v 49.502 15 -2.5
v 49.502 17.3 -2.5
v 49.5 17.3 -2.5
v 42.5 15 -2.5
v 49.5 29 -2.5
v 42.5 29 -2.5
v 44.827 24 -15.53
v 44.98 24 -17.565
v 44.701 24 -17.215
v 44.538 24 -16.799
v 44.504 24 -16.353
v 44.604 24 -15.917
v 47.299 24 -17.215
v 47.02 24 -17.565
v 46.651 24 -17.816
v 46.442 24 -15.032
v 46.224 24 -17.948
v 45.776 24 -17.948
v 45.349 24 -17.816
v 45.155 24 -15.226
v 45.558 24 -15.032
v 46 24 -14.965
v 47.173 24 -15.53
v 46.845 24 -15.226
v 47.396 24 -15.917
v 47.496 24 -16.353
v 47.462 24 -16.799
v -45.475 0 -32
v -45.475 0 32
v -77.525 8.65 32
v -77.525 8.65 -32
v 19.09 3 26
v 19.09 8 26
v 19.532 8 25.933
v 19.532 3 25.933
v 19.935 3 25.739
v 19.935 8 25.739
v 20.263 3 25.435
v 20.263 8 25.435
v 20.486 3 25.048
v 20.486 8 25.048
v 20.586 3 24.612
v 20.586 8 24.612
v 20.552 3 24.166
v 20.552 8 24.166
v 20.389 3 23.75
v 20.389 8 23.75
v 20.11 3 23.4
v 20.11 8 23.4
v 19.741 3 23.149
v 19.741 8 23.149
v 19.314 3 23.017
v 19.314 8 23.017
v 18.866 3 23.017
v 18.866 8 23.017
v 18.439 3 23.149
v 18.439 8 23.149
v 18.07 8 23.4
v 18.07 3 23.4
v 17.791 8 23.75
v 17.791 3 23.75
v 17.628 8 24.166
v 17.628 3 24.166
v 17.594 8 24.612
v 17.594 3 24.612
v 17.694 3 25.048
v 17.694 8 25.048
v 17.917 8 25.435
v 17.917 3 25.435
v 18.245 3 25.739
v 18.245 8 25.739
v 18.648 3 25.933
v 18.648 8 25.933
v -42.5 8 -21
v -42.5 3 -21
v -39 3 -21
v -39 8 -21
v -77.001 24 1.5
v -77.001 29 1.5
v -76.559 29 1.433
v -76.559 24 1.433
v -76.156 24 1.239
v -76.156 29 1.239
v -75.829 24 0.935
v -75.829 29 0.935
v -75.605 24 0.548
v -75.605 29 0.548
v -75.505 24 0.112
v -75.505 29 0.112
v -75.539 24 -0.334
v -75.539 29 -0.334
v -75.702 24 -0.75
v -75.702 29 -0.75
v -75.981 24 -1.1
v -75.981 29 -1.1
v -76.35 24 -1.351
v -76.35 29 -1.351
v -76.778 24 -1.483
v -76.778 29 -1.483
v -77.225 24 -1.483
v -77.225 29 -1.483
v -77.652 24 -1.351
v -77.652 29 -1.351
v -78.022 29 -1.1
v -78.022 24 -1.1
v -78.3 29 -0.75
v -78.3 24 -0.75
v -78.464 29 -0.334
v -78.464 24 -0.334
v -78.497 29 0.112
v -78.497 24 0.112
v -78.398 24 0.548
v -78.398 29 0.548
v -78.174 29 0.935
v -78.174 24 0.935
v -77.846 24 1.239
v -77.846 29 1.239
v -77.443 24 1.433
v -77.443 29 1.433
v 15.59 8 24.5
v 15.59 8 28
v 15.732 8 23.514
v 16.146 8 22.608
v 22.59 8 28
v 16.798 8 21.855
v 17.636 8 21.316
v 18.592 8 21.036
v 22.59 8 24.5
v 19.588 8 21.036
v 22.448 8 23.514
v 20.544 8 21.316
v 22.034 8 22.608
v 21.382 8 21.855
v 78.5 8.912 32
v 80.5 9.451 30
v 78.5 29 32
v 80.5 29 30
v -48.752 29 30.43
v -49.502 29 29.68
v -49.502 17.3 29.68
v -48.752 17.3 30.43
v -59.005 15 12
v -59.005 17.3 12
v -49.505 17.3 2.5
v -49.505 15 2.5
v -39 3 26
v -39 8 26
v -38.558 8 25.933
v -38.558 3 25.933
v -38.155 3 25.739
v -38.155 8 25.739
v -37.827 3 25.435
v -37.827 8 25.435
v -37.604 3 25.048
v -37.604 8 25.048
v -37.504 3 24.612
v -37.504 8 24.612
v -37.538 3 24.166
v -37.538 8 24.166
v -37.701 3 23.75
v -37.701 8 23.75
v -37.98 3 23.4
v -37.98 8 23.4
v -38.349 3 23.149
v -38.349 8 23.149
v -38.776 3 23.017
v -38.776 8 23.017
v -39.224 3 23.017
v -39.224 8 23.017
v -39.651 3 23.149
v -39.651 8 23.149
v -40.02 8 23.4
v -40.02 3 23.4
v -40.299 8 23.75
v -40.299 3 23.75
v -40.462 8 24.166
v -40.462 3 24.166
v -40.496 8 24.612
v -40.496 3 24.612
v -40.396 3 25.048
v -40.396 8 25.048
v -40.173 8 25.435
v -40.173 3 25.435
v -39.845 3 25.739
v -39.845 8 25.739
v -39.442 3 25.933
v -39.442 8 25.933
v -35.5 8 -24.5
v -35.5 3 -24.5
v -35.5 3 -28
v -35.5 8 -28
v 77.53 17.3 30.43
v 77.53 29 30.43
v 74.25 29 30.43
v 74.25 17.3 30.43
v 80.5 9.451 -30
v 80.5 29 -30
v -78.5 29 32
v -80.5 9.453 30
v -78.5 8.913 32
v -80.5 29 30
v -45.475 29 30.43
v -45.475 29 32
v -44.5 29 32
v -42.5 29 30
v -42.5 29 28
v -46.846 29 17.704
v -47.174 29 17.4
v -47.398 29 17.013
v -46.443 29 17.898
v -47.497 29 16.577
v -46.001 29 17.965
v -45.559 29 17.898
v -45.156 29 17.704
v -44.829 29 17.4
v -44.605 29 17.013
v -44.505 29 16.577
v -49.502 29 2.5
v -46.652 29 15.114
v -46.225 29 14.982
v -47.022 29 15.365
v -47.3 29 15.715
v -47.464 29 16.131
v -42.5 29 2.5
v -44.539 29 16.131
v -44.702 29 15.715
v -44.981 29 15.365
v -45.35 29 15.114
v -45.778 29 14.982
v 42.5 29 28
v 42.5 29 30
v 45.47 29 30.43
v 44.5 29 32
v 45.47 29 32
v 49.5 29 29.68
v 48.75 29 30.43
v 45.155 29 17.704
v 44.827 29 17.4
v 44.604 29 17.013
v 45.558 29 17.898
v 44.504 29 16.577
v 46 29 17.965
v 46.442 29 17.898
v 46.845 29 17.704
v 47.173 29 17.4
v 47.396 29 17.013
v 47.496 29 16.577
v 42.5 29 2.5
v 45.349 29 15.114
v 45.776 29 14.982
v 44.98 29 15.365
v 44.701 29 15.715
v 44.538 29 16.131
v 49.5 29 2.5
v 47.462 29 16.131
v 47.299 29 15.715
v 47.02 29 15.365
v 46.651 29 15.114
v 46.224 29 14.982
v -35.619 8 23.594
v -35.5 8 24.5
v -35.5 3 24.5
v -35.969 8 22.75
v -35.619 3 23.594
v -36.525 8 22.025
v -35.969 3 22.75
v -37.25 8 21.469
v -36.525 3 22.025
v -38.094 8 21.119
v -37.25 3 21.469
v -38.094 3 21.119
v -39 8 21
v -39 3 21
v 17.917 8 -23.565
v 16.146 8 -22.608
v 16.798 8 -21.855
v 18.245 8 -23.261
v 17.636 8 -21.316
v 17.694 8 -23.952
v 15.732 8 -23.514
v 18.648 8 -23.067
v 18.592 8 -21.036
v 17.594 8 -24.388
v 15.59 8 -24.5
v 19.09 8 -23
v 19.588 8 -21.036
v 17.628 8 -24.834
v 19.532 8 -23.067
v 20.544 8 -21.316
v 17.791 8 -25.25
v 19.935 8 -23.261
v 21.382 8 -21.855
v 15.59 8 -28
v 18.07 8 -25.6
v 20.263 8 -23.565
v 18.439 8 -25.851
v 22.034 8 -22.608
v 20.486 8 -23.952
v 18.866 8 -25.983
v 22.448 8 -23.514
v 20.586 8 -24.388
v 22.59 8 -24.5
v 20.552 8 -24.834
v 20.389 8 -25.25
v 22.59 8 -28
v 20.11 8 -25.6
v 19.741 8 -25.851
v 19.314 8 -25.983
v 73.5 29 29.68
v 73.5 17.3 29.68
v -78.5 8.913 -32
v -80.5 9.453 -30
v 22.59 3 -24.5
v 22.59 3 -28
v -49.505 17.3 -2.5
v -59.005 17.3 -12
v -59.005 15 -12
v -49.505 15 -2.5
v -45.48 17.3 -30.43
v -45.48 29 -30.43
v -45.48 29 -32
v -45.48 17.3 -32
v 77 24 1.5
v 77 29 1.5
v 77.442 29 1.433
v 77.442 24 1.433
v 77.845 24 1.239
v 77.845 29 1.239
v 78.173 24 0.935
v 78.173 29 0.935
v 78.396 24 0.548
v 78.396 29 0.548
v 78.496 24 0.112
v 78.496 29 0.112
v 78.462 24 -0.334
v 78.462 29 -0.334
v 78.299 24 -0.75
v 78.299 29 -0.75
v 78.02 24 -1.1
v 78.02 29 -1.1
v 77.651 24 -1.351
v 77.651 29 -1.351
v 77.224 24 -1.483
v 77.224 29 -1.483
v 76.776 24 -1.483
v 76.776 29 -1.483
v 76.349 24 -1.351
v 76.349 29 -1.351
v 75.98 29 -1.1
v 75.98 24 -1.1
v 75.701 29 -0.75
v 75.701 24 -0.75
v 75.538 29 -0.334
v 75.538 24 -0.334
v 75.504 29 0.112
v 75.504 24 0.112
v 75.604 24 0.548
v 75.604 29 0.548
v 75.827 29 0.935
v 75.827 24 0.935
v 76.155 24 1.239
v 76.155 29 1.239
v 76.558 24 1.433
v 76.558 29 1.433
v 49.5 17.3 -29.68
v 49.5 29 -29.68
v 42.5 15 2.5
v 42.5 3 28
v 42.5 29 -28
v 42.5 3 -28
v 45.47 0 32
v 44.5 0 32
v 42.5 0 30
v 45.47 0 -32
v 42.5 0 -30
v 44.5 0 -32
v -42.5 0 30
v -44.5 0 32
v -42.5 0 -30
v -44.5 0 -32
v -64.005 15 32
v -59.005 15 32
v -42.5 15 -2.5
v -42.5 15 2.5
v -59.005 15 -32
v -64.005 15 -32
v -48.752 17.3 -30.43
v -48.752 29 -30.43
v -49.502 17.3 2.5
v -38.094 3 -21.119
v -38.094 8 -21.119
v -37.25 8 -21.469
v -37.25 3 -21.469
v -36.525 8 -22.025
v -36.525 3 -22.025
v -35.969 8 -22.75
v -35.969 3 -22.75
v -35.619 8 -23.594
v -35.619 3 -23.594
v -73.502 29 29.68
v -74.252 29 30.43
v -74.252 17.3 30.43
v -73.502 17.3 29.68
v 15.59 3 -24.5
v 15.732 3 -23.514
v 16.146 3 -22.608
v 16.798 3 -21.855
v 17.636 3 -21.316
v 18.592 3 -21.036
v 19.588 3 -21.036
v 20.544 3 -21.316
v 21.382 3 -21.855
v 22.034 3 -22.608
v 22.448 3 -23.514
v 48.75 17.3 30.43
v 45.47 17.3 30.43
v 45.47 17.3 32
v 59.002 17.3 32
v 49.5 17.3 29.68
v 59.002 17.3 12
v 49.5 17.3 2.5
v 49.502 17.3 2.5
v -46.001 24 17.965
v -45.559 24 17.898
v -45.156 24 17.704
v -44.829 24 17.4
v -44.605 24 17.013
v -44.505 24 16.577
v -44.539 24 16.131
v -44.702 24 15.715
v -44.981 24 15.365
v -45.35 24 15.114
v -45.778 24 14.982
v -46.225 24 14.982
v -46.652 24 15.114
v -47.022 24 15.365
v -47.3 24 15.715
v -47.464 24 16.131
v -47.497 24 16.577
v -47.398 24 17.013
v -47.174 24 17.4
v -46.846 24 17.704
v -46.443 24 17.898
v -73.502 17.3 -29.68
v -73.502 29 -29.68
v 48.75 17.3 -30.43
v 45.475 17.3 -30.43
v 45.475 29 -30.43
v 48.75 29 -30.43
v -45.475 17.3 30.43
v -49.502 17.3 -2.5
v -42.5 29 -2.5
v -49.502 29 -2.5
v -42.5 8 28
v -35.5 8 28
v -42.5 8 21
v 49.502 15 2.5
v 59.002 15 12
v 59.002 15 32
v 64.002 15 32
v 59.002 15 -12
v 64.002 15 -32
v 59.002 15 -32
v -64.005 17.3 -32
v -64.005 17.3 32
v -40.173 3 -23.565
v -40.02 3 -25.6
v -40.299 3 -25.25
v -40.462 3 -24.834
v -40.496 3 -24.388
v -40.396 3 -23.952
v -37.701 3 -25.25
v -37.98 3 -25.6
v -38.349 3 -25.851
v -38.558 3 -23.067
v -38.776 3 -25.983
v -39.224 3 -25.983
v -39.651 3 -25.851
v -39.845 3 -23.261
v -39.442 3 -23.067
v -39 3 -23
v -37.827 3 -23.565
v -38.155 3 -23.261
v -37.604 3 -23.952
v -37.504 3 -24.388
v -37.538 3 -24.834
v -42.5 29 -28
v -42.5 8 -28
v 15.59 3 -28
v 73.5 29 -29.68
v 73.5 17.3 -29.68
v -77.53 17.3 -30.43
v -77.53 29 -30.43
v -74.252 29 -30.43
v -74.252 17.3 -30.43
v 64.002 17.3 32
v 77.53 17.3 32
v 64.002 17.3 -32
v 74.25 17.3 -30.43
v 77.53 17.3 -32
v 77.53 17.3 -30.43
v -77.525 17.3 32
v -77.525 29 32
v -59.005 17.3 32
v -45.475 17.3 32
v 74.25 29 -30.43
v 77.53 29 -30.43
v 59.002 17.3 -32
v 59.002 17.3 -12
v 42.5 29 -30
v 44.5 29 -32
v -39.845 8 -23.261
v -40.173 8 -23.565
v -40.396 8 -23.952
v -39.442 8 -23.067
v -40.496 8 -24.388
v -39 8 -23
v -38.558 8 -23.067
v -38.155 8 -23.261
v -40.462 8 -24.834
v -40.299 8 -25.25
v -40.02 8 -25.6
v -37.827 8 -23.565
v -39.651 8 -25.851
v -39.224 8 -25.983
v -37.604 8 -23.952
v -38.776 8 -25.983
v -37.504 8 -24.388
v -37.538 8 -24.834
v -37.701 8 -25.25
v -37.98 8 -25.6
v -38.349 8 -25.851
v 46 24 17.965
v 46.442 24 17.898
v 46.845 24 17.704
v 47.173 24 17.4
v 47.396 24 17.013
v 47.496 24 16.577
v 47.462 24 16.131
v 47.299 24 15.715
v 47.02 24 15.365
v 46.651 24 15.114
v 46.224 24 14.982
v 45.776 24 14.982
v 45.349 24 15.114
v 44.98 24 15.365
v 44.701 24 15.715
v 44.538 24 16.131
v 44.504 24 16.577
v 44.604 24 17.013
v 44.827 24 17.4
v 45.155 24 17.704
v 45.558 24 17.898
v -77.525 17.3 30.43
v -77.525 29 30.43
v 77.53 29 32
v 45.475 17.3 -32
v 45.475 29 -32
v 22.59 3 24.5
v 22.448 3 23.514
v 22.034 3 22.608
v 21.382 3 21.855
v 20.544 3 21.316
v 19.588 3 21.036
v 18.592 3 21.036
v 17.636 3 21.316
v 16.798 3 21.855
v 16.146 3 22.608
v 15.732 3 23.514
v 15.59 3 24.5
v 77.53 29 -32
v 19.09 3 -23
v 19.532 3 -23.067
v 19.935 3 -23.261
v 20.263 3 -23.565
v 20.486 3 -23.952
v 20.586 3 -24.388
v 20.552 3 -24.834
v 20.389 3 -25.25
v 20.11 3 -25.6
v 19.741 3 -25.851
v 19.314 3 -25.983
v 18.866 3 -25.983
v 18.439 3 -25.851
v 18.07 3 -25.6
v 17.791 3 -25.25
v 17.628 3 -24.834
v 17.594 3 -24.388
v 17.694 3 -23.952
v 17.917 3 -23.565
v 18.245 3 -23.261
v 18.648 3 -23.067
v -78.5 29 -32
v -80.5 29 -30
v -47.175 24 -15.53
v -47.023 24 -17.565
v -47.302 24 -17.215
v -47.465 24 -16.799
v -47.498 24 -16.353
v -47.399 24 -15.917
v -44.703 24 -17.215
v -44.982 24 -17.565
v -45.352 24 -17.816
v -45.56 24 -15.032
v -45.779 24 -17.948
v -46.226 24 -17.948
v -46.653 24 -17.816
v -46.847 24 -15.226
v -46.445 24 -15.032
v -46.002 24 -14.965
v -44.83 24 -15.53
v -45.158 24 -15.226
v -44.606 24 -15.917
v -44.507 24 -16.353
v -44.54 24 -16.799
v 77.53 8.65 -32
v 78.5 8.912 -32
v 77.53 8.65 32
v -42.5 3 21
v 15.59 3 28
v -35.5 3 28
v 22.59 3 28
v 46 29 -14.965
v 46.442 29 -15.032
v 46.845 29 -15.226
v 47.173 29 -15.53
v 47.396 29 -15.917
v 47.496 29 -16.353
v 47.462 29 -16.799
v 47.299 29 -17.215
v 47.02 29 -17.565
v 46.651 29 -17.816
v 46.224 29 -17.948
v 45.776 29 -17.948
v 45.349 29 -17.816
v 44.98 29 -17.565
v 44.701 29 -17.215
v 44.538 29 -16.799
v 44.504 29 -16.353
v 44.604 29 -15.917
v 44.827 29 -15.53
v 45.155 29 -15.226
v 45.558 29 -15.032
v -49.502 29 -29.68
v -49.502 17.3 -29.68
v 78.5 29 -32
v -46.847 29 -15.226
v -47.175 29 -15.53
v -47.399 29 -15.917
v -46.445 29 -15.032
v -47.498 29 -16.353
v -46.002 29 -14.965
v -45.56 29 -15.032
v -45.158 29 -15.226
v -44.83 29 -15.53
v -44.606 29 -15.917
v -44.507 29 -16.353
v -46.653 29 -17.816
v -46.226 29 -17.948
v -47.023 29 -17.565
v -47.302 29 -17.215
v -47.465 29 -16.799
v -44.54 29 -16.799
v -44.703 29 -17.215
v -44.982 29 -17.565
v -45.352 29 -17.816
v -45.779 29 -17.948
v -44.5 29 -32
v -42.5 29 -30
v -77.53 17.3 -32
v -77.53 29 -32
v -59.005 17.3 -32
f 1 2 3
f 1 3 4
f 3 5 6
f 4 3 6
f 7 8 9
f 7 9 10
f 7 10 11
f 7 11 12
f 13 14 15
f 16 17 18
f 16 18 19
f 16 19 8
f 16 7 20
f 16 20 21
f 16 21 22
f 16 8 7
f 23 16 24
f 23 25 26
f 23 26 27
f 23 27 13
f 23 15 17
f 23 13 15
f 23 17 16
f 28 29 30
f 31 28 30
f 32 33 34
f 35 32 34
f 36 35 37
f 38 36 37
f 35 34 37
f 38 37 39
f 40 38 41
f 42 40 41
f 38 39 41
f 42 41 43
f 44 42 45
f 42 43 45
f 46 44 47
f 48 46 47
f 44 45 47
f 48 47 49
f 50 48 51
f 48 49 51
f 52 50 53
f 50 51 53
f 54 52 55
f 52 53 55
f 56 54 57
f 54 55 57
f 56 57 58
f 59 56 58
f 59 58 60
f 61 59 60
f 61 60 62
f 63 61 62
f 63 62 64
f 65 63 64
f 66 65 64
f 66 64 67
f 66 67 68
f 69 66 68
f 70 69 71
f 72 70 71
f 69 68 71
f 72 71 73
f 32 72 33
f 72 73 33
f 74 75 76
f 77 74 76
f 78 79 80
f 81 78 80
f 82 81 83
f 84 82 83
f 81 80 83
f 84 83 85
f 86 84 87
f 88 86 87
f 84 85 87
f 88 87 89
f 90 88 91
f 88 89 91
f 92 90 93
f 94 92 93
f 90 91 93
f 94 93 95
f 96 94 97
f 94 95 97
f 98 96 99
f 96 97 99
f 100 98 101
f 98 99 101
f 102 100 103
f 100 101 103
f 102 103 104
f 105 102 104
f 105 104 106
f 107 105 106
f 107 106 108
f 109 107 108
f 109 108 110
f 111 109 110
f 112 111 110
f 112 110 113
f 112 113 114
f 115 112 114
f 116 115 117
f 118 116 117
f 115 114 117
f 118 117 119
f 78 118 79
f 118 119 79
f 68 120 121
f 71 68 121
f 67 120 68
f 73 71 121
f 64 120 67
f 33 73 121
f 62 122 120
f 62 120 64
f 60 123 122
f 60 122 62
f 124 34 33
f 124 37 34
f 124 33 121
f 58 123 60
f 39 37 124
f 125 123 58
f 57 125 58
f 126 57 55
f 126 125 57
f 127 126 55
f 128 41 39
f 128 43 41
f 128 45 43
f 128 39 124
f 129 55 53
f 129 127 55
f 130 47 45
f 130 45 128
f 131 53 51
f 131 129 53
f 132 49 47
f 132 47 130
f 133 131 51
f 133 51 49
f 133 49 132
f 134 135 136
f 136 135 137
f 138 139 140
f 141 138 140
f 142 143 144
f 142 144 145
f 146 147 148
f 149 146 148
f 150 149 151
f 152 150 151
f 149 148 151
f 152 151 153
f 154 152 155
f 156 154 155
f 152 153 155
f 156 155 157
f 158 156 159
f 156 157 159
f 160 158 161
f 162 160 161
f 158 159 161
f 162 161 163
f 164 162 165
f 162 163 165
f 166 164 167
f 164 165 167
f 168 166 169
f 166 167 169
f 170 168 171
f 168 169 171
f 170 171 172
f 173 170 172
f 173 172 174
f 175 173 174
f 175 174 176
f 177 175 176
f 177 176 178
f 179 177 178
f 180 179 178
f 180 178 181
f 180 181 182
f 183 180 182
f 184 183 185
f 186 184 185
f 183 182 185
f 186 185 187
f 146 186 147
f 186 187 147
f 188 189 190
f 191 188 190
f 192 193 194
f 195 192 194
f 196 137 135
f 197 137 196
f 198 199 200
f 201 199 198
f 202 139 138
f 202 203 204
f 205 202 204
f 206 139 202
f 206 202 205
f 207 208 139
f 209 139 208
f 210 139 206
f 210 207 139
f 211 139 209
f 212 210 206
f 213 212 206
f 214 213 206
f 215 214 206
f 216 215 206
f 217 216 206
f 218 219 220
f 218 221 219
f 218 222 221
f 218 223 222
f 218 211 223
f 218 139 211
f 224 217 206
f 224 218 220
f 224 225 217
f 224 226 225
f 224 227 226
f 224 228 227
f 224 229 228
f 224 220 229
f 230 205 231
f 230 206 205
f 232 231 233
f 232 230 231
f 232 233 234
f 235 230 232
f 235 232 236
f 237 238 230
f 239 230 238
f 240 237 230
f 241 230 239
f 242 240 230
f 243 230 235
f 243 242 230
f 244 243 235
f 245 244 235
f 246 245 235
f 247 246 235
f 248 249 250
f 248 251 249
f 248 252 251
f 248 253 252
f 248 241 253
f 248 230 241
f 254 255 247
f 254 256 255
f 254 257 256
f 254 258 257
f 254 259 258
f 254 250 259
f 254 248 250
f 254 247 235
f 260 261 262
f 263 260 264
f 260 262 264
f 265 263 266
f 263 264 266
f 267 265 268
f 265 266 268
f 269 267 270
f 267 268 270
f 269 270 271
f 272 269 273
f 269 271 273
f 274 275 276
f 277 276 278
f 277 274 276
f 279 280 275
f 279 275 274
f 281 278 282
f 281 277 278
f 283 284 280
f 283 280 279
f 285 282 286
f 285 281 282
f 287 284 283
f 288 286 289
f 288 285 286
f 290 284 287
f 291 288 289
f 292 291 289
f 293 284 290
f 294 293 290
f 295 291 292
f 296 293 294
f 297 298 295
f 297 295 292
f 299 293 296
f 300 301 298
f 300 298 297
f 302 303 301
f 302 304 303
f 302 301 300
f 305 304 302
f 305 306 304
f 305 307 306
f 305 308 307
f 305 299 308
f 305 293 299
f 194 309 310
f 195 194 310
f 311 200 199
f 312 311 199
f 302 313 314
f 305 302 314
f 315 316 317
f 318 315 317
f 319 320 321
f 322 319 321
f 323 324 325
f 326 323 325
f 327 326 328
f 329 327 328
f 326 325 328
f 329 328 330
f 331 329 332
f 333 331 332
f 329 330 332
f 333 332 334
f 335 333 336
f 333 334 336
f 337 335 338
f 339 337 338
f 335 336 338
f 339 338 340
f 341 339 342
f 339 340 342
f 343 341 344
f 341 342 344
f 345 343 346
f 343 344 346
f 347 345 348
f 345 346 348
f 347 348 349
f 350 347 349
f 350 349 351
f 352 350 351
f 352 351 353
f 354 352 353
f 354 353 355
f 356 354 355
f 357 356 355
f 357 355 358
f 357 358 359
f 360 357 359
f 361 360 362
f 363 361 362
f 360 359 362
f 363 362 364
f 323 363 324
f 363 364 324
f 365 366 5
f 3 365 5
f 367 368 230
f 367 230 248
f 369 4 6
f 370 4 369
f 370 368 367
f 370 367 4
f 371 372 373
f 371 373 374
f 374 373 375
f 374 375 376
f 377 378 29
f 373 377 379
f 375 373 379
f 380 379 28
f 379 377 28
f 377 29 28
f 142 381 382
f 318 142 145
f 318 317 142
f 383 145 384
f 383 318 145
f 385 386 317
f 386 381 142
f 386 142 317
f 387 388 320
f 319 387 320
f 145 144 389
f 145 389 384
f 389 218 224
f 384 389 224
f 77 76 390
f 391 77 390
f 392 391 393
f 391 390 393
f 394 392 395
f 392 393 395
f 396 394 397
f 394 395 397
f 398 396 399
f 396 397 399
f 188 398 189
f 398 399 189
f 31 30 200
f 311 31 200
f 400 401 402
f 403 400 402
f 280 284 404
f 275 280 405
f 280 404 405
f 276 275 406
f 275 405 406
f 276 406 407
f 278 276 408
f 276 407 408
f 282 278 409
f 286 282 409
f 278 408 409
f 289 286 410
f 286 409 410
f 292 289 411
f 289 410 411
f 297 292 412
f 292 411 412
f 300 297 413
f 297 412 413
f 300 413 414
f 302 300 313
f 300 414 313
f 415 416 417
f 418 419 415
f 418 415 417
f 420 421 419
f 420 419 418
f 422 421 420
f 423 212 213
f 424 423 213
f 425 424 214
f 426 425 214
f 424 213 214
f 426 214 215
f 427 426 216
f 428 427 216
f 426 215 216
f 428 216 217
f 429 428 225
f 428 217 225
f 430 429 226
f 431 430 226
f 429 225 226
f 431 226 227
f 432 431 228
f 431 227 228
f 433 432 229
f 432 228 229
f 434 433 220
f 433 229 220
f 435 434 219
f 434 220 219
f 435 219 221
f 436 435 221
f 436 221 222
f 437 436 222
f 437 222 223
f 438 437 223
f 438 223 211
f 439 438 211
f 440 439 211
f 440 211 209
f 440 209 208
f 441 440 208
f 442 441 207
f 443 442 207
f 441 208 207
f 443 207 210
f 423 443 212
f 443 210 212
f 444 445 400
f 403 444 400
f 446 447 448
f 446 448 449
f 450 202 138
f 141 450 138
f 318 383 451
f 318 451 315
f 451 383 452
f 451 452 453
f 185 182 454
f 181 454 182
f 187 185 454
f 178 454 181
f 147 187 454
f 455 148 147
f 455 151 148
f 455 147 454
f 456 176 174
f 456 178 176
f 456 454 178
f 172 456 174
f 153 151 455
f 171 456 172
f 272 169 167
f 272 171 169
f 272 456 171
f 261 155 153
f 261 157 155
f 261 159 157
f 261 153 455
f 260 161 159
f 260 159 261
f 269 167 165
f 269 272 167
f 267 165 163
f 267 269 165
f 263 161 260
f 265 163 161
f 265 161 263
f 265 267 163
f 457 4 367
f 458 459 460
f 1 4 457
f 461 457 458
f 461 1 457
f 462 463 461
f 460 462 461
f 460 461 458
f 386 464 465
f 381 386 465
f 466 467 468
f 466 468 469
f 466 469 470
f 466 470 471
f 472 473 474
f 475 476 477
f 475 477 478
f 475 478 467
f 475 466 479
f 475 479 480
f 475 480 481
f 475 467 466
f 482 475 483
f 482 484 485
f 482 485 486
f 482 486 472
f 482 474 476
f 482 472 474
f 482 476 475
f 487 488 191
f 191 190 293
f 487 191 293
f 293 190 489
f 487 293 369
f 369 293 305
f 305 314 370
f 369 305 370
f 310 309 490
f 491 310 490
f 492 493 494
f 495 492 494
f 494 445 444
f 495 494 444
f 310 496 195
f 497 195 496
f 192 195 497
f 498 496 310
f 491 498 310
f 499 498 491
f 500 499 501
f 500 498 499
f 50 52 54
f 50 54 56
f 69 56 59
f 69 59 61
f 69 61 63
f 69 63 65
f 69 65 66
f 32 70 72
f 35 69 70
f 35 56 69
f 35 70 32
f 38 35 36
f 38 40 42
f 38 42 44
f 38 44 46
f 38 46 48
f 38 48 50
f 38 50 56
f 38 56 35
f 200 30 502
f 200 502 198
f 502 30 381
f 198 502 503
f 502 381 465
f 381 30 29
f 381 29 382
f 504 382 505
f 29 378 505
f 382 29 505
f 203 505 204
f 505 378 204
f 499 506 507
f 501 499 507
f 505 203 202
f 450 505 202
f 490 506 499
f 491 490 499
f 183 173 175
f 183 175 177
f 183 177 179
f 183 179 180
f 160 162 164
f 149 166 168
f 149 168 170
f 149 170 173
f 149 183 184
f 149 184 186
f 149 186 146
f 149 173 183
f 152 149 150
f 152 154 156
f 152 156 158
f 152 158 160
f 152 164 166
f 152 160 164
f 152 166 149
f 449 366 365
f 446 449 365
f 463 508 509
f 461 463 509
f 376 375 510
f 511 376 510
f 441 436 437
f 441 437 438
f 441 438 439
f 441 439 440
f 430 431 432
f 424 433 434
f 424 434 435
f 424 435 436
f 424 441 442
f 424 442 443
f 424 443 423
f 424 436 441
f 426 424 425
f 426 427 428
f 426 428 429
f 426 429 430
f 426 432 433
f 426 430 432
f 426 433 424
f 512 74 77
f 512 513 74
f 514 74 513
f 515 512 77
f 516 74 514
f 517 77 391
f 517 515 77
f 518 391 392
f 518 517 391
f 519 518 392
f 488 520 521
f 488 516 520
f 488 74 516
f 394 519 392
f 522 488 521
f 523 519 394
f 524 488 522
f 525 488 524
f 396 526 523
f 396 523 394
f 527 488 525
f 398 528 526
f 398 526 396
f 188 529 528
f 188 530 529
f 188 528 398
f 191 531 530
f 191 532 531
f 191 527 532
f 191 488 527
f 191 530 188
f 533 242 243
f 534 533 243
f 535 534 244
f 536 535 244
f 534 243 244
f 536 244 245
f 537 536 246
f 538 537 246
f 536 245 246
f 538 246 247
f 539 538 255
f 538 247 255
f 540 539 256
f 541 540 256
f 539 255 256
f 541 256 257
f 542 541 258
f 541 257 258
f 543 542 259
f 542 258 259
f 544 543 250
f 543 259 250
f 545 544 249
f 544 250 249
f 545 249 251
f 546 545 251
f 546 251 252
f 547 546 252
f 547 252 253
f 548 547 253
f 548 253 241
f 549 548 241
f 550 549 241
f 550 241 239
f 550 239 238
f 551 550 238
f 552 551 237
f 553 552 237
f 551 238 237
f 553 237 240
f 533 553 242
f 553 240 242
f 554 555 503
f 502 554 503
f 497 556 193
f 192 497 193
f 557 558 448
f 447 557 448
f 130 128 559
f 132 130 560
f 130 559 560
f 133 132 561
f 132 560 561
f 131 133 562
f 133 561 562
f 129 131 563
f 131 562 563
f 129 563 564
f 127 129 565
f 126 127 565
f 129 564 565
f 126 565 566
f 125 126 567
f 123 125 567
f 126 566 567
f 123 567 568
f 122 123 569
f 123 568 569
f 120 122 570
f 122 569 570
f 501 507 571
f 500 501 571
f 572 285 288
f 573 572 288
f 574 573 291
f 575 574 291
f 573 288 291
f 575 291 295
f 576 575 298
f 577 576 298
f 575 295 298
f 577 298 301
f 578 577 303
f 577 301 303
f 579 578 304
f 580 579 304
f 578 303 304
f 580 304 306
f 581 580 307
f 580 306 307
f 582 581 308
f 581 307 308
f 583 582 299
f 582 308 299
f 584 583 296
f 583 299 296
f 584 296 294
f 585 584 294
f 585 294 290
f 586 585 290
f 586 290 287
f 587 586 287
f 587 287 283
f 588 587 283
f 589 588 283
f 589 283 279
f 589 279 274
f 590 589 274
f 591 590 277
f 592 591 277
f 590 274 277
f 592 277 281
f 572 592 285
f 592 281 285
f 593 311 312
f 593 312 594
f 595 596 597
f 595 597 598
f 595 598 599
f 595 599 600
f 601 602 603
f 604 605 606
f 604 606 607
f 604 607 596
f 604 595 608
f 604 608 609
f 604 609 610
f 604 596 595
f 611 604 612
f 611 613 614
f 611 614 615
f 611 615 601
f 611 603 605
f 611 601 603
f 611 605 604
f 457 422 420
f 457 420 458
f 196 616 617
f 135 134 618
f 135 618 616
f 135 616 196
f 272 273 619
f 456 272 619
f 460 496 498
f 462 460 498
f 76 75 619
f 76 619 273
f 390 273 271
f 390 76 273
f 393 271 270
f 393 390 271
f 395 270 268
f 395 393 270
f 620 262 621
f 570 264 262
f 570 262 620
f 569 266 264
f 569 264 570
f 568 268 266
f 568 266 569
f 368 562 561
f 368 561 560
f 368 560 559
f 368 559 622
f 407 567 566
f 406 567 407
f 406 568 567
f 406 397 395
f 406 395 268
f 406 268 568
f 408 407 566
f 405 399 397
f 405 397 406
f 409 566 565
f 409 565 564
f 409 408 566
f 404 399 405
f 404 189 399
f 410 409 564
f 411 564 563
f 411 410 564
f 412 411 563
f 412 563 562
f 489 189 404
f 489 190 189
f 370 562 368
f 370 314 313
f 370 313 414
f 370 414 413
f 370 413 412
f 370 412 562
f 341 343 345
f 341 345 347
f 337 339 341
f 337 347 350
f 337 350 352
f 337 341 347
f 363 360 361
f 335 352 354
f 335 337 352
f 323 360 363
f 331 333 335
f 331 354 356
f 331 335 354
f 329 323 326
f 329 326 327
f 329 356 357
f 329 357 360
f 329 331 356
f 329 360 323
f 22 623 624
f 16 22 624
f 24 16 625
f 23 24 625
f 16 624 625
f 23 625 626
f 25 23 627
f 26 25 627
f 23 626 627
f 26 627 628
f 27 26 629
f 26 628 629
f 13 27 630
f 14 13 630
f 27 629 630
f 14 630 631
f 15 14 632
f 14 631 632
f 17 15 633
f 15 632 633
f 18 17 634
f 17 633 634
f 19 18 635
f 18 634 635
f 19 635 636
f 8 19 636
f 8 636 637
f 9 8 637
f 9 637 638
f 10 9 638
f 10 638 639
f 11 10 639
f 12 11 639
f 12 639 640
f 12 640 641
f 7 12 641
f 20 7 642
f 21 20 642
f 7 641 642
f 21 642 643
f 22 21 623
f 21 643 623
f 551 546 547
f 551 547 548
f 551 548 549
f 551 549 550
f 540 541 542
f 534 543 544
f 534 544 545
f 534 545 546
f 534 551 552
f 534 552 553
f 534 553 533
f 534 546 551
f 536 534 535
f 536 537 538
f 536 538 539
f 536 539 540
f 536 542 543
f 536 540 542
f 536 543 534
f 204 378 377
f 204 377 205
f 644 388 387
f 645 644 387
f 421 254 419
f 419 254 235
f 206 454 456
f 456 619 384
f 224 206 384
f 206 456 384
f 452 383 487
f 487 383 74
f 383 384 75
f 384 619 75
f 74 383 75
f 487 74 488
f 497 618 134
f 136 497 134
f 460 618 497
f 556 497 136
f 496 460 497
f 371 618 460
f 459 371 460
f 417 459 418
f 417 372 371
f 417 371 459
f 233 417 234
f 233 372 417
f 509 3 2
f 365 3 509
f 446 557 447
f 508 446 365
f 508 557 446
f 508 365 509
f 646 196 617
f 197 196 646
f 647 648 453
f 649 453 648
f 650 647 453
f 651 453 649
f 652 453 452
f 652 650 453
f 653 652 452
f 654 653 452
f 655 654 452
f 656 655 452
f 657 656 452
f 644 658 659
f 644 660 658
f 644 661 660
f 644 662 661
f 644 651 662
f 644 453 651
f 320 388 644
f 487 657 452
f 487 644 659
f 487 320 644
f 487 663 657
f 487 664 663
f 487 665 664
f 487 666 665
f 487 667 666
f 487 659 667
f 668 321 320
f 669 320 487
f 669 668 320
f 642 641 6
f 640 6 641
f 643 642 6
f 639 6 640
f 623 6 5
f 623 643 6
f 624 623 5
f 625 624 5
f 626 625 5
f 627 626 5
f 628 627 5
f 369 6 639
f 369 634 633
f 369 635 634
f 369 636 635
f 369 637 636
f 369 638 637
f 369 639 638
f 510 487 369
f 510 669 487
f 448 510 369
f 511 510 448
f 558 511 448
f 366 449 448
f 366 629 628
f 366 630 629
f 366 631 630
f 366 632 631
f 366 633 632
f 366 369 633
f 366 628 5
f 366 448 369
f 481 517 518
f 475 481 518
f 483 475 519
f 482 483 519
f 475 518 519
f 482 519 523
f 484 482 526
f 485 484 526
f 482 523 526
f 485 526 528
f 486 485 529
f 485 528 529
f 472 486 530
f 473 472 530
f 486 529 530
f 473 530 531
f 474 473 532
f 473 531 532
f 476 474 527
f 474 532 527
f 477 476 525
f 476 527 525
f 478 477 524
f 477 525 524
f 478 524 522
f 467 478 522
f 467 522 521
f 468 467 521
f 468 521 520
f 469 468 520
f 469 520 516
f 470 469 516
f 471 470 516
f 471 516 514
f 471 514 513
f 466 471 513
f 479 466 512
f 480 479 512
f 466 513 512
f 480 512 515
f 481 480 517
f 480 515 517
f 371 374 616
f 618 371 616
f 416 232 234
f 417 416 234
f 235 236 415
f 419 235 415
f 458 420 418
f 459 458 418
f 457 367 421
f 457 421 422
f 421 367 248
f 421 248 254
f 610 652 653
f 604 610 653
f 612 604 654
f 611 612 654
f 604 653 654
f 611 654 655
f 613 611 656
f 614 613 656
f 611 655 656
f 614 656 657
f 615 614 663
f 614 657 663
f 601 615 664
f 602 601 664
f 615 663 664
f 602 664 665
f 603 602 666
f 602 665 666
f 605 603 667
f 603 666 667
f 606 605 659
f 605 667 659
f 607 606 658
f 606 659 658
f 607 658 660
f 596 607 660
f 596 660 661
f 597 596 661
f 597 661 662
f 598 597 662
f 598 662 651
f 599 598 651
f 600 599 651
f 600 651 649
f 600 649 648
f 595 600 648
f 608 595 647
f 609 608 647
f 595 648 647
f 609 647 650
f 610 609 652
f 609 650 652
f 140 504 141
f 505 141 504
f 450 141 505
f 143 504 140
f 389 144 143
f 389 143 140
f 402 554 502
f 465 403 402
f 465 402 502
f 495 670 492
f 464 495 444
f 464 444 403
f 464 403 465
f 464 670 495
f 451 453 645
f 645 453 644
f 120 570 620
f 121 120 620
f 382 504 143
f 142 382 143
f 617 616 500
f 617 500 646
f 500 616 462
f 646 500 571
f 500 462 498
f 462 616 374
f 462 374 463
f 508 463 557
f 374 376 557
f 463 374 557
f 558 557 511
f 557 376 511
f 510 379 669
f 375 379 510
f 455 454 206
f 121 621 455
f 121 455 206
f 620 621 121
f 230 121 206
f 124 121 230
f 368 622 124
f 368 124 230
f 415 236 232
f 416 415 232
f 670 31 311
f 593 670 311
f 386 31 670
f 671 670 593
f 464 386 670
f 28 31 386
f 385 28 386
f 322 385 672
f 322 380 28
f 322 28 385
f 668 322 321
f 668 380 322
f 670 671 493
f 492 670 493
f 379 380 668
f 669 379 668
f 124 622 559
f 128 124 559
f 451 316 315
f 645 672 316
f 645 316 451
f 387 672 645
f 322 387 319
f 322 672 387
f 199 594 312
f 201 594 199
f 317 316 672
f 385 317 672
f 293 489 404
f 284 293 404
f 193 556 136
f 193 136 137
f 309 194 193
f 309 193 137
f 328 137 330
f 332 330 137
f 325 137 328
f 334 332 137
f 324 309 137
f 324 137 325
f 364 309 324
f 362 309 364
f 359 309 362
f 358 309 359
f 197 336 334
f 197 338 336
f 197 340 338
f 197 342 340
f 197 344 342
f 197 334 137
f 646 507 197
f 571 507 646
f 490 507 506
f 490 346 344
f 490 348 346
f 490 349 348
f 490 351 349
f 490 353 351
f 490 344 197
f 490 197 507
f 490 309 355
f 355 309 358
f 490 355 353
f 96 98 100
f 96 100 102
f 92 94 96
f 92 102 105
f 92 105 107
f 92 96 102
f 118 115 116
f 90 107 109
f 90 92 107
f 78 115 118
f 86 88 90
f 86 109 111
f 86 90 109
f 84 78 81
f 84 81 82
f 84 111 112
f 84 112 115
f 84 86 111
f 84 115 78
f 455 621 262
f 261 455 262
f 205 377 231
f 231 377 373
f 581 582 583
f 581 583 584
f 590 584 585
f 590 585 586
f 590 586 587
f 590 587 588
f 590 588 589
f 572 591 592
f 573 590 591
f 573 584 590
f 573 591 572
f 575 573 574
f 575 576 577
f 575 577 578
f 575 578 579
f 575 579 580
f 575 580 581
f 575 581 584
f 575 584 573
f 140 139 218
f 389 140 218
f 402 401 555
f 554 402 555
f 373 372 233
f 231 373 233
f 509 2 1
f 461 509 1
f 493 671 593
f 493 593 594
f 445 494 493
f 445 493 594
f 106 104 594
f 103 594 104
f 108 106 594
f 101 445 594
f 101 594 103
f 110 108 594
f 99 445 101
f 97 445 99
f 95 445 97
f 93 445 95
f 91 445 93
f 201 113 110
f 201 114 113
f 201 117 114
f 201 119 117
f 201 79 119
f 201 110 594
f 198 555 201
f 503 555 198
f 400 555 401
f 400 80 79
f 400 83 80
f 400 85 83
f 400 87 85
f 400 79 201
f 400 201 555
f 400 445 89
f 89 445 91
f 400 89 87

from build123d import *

# Parameters (mm, degrees)
SKETCH2_W            = 85
SKETCH2_H            = 56
BOSS_EXTRUDE4_DEPTH  = 3
SKETCH3_W            = 89
SKETCH3_H            = 60
SKETCH3_W_2          = 85
SKETCH3_H_2          = 56
BOSS_EXTRUDE5_DEPTH  = 29
SKETCH5_R            = 3.5
BOSS_EXTRUDE10_DEPTH = 8
CUT_EXTRUDE1_DEPTH   = 11.7
CHAMFER1_SIZE        = 2
CUT_EXTRUDE2_DEPTH   = 11.7
SKETCH8_W            = 64
SKETCH8_H            = 29
BOSS_EXTRUDE11_DEPTH = 2
SKETCH9_W            = 64
SKETCH9_H            = 29
BOSS_EXTRUDE12_DEPTH = 2
CHAMFER2_SIZE        = 2
CHAMFER3_SIZE        = 0.75
CUT_EXTRUDE4_DEPTH   = 107.851532511
SKETCH10_W           = 7.0025
SKETCH10_H           = 5
SKETCH10_W_2         = 85
SKETCH10_W_3         = 7
CUT_EXTRUDE5_DEPTH   = 14
CHAMFER4_SIZE        = 9.5
SKETCH14_R           = 1.5
CUT_EXTRUDE7_DEPTH   = 5
SKETCH15_R           = 1.5
CUT_EXTRUDE8_DEPTH   = 5


with BuildPart() as part:
    # Sketch2 → Boss-Extrude4 (new body)
    with BuildSketch(Plane(origin=(0, 0, 0), x_dir=(1, 0, 0), z_dir=(0, 1, 0))):
        Rectangle(SKETCH2_W, SKETCH2_H)
    extrude(amount=BOSS_EXTRUDE4_DEPTH)

    # Sketch3 → Boss-Extrude5 (add)
    # profile 1 of 3: a face of its own
    with BuildSketch(Plane(origin=(0, 0, 0), x_dir=(1, 0, 0), z_dir=(0, 1, 0))):
        Rectangle(SKETCH3_W, SKETCH3_H)
        Rectangle(SKETCH3_W_2, SKETCH3_H_2, mode=Mode.SUBTRACT)
    # profile 2 of 3: a face of its own
    with BuildSketch(Plane(origin=(0, 0, 0), x_dir=(1, 0, 0), z_dir=(0, 1, 0))):
        Polygon((-78.5, -32), (-44.5, -32), (-44.5, -30), (-44.5, 30), (-44.5, 32), (-78.5, 32), (-78.5, 0), align=None)
    # profile 3 of 3: a face of its own
    with BuildSketch(Plane(origin=(0, 0, 0), x_dir=(1, 0, 0), z_dir=(0, 1, 0))):
        Polygon((44.5, -32), (44.5, -30), (44.5, 30), (44.5, 32), (78.5, 32), (78.5, 0), (78.5, -32), align=None)
    extrude(amount=BOSS_EXTRUDE5_DEPTH)

    # Sketch5 → Boss-Extrude10 (add)
    with BuildSketch(Plane(origin=(0, 0, 0), x_dir=(1, 0, 0), z_dir=(0, 1, 0))):
        with Locations((-39, 24.5)):
            Circle(SKETCH5_R)
        with BuildLine():
            ThreePointArc((-42.5, 24.5), (-41.474873734, 26.974873734), (-39, 28))
            Line((-39, 28), (-42.5, 28))
            Line((-42.5, 28), (-42.5, 24.5))
        make_face()
        with BuildLine():
            ThreePointArc((-39, 21), (-41.474873734, 22.025126266), (-42.5, 24.5))
            Line((-42.5, 24.5), (-42.5, 21))
            Line((-42.5, 21), (-39, 21))
        make_face()
        with BuildLine():
            Line((-35.5, 24.5), (-35.5, 28))
            Line((-35.5, 28), (-39, 28))
            ThreePointArc((-39, 28), (-36.525126266, 26.974873734), (-35.5, 24.5))
        make_face()
        with BuildLine():
            ThreePointArc((-35.5, -24.5), (-36.525126266, -26.974873734), (-39, -28))
            Line((-39, -28), (-35.5, -28))
            Line((-35.5, -28), (-35.5, -24.5))
        make_face()
        with Locations((-39, -24.5)):
            Circle(SKETCH5_R)
        with BuildLine():
            ThreePointArc((-39, -28), (-41.474873734, -26.974873734), (-42.5, -24.5))
            Line((-42.5, -24.5), (-42.5, -28))
            Line((-42.5, -28), (-39, -28))
        make_face()
        with BuildLine():
            Line((-39, -21), (-42.5, -21))
            Line((-42.5, -21), (-42.5, -24.5))
            ThreePointArc((-42.5, -24.5), (-41.474873734, -22.025126266), (-39, -21))
        make_face()
        with BuildLine():
            Line((19.08999999, -28), (22.59, -28))
            Line((22.59, -28), (22.59, -24.5))
            ThreePointArc((22.59, -24.5), (21.564873731, -26.974873738), (19.08999999, -28))
        make_face()
        with Locations((19.09, -24.5)):
            Circle(SKETCH5_R)
        with BuildLine():
            Line((15.59, -28), (19.08999999, -28))
            ThreePointArc((19.08999999, -28), (16.615126262, -26.974873731), (15.59, -24.5))
            Line((15.59, -24.5), (15.59, -28))
        make_face()
        with BuildLine():
            ThreePointArc((19.09, 28), (21.564873734, 26.974873734), (22.59, 24.5))
            Line((22.59, 24.5), (22.59, 28))
            Line((22.59, 28), (19.09, 28))
        make_face()
        with BuildLine():
            Line((15.59, 28), (15.59, 24.5))
            ThreePointArc((15.59, 24.5), (16.615126266, 26.974873734), (19.09, 28))
            Line((19.09, 28), (15.59, 28))
        make_face()
        with Locations((19.09, 24.5)):
            Circle(SKETCH5_R)
    extrude(amount=BOSS_EXTRUDE10_DEPTH)

    # Sketch6 → Cut-Extrude1 (cut)
    with BuildSketch(Plane(origin=(0, 29, 0), x_dir=(1, 0, 0), z_dir=(0, 1, 0))):
        Polygon((-73.5025, 30.43), (-49.5025, 30.43), (-45.48, 30.43), (-45.48, 32), (-77.53, 32), (-77.53, 30.43), align=None)
        Polygon((-73.5025, -30.43), (-49.5025, -30.43), (-49.5025, 0), (-49.5025, 30.43), (-73.5025, 30.43), (-73.5025, 0), align=None)
        Polygon((-77.525, -32), (-45.475, -32), (-45.475, -30.43), (-49.5025, -30.43), (-73.5025, -30.43), (-77.525, -30.43), align=None)
    extrude(amount=-CUT_EXTRUDE1_DEPTH, mode=Mode.SUBTRACT)

    # Chamfer1
    chamfer1_edges = [part.edges().sort_by_distance(p)[0] for p in [
        (-44.5, 14.5, 30),
        (44.5, 14.5, 30),
        (44.5, 14.5, -30),
        (-44.5, 14.5, -30),
    ]]
    chamfer(chamfer1_edges, length=CHAMFER1_SIZE - 0.0001)  # a hair under: the kernel refuses the full size

    # Sketch7 → Cut-Extrude2 (cut)
    with BuildSketch(Plane(origin=(0, 29, 0), x_dir=(1, 0, 0), z_dir=(0, 1, 0))):
        Polygon((61.5, 32), (45.475, 32), (45.475, 30.43), (49.5, 30.43), (49.5, -30.43), (45.47, -30.43), (45.47, -32), (61.5, -32), (77.53, -32), (77.53, -30.43), (73.5, -30.43), (73.5, 30.43), (77.53, 30.43), (77.53, 32), align=None)
    extrude(amount=-CUT_EXTRUDE2_DEPTH, mode=Mode.SUBTRACT)

    # Sketch8 → Boss-Extrude11 (add)
    with BuildSketch(Plane.ZY.offset(78.5)):
        with Locations((0, 14.5)):
            Rectangle(SKETCH8_W, SKETCH8_H)
    extrude(amount=BOSS_EXTRUDE11_DEPTH)

    # Sketch9 → Boss-Extrude12 (add)
    with BuildSketch(Plane(origin=(78.5, 0, 0), x_dir=(0, 0, -1), z_dir=(1, 0, 0))):
        with Locations((0, 14.5)):
            Rectangle(SKETCH9_W, SKETCH9_H)
    extrude(amount=BOSS_EXTRUDE12_DEPTH)

    # Chamfer2
    chamfer2_edges = [part.edges().sort_by_distance(p)[0] for p in [
        (-80.5, 14.5, -32),
        (-80.5, 14.5, 32),
        (80.5, 14.5, 32),
        (80.5, 14.5, -32),
    ]]
    chamfer(chamfer2_edges, length=CHAMFER2_SIZE)

    # Chamfer3
    chamfer3_edges = [part.edges().sort_by_distance(p)[0] for p in [
        (-73.5025, 23.15, -30.43),
        (-49.5025, 23.15, -30.43),
        (-49.5025, 23.15, 30.43),
        (-73.5025, 23.15, 30.43),
        (73.5, 23.15, -30.43),
        (73.5, 23.15, 30.43),
        (49.5, 23.15, 30.43),
        (49.5, 23.15, -30.43),
    ]]
    chamfer(chamfer3_edges, length=CHAMFER3_SIZE)

    # Sketch11 → Cut-Extrude4 (cut, through all)
    with BuildSketch(Plane.XY.offset(32)):
        Polygon((104.627072185, -13.366120131), (45.47, 0), (77.53, 8.65), (97.251349741, 13.97095057), align=None)
        Polygon((-80.747190975, -16.87538219), (-45.475, 0), (-78.5, 0), (-78.5, 8.913143526), (-93.850671493, 13.056148468), align=None)
        Polygon((-45.475, 0), (-77.525, 8.65), (-78.5, 8.913143526), (-78.5, 0), align=None)
    extrude(amount=-CUT_EXTRUDE4_DEPTH, mode=Mode.SUBTRACT)

    # Sketch10 → Cut-Extrude5 (cut)
    with BuildSketch(Plane(origin=(0, 29, 0), x_dir=(1, 0, 0), z_dir=(0, 1, 0))):
        Polygon((-59.005, -32), (-59.005, 32), (-61.505, 32), (-64.005, 32), (-64.005, -32), (-61.5, -32), align=None)
        Polygon((-49.5025, 2.5), (-59.005, 2.5), (-59.005, 0), (-59.005, -2.5), (-49.5025, -2.5), align=None)
        with Locations((-46.00125, 0)):
            Rectangle(SKETCH10_W, SKETCH10_H)
        Rectangle(SKETCH10_W_2, SKETCH10_H)
        with Locations((46, 0)):
            Rectangle(SKETCH10_W_3, SKETCH10_H)
        Polygon((59.0025, 2.5), (49.5, 2.5), (49.5, -2.5), (59.0025, -2.5), (59.0025, 0), align=None)
        Polygon((64.0025, -32), (64.0025, 32), (61.5025, 32), (59.0025, 32), (59.0025, -32), (61.5, -32), align=None)
    extrude(amount=-CUT_EXTRUDE5_DEPTH, mode=Mode.SUBTRACT)

    # Chamfer4
    chamfer4_edges = [part.edges().sort_by_distance(p)[0] for p in [
        (-59.005, 16.15, -2.5),
        (59.0025, 16.15, -2.5),
        (59.0025, 16.15, 2.5),
        (-59.005, 16.15, 2.5),
    ]]
    chamfer(chamfer4_edges, length=CHAMFER4_SIZE)

    # Sketch14 → Cut-Extrude7 (cut)
    with BuildSketch(Plane(origin=(0, 8, 0), x_dir=(1, 0, 0), z_dir=(0, 1, 0))):
        with Locations(Location((19.09, -24.5, 0), (0, 0, 270))):
            Circle(SKETCH14_R)
        with Locations(Location((-39, -24.5, 0), (0, 0, 270))):
            Circle(SKETCH14_R)
        with Locations(Location((-39, 24.5, 0), (0, 0, 270))):
            Circle(SKETCH14_R)
        with Locations(Location((19.09, 24.5, 0), (0, 0, 270))):
            Circle(SKETCH14_R)
    extrude(amount=-CUT_EXTRUDE7_DEPTH, mode=Mode.SUBTRACT)

    # Sketch15 → Cut-Extrude8 (cut)
    with BuildSketch(Plane(origin=(0, 29, 0), x_dir=(1, 0, 0), z_dir=(0, 1, 0))):
        with Locations(Location((46, 16.465, 0), (0, 0, 270))):
            Circle(SKETCH15_R)
        with Locations(Location((46, -16.465, 0), (0, 0, 270))):
            Circle(SKETCH15_R)
        with Locations(Location((77, 0, 0), (0, 0, 270))):
            Circle(SKETCH15_R)
        with Locations(Location((-46.0025, 16.465, 0), (0, 0, 270))):
            Circle(SKETCH15_R)
        with Locations(Location((-46.00125, -16.465, 0), (0, 0, 270))):
            Circle(SKETCH15_R)
        with Locations(Location((-77.00125, 0, 0), (0, 0, 270))):
            Circle(SKETCH15_R)
    extrude(amount=-CUT_EXTRUDE8_DEPTH, mode=Mode.SUBTRACT)


solid = part.part
